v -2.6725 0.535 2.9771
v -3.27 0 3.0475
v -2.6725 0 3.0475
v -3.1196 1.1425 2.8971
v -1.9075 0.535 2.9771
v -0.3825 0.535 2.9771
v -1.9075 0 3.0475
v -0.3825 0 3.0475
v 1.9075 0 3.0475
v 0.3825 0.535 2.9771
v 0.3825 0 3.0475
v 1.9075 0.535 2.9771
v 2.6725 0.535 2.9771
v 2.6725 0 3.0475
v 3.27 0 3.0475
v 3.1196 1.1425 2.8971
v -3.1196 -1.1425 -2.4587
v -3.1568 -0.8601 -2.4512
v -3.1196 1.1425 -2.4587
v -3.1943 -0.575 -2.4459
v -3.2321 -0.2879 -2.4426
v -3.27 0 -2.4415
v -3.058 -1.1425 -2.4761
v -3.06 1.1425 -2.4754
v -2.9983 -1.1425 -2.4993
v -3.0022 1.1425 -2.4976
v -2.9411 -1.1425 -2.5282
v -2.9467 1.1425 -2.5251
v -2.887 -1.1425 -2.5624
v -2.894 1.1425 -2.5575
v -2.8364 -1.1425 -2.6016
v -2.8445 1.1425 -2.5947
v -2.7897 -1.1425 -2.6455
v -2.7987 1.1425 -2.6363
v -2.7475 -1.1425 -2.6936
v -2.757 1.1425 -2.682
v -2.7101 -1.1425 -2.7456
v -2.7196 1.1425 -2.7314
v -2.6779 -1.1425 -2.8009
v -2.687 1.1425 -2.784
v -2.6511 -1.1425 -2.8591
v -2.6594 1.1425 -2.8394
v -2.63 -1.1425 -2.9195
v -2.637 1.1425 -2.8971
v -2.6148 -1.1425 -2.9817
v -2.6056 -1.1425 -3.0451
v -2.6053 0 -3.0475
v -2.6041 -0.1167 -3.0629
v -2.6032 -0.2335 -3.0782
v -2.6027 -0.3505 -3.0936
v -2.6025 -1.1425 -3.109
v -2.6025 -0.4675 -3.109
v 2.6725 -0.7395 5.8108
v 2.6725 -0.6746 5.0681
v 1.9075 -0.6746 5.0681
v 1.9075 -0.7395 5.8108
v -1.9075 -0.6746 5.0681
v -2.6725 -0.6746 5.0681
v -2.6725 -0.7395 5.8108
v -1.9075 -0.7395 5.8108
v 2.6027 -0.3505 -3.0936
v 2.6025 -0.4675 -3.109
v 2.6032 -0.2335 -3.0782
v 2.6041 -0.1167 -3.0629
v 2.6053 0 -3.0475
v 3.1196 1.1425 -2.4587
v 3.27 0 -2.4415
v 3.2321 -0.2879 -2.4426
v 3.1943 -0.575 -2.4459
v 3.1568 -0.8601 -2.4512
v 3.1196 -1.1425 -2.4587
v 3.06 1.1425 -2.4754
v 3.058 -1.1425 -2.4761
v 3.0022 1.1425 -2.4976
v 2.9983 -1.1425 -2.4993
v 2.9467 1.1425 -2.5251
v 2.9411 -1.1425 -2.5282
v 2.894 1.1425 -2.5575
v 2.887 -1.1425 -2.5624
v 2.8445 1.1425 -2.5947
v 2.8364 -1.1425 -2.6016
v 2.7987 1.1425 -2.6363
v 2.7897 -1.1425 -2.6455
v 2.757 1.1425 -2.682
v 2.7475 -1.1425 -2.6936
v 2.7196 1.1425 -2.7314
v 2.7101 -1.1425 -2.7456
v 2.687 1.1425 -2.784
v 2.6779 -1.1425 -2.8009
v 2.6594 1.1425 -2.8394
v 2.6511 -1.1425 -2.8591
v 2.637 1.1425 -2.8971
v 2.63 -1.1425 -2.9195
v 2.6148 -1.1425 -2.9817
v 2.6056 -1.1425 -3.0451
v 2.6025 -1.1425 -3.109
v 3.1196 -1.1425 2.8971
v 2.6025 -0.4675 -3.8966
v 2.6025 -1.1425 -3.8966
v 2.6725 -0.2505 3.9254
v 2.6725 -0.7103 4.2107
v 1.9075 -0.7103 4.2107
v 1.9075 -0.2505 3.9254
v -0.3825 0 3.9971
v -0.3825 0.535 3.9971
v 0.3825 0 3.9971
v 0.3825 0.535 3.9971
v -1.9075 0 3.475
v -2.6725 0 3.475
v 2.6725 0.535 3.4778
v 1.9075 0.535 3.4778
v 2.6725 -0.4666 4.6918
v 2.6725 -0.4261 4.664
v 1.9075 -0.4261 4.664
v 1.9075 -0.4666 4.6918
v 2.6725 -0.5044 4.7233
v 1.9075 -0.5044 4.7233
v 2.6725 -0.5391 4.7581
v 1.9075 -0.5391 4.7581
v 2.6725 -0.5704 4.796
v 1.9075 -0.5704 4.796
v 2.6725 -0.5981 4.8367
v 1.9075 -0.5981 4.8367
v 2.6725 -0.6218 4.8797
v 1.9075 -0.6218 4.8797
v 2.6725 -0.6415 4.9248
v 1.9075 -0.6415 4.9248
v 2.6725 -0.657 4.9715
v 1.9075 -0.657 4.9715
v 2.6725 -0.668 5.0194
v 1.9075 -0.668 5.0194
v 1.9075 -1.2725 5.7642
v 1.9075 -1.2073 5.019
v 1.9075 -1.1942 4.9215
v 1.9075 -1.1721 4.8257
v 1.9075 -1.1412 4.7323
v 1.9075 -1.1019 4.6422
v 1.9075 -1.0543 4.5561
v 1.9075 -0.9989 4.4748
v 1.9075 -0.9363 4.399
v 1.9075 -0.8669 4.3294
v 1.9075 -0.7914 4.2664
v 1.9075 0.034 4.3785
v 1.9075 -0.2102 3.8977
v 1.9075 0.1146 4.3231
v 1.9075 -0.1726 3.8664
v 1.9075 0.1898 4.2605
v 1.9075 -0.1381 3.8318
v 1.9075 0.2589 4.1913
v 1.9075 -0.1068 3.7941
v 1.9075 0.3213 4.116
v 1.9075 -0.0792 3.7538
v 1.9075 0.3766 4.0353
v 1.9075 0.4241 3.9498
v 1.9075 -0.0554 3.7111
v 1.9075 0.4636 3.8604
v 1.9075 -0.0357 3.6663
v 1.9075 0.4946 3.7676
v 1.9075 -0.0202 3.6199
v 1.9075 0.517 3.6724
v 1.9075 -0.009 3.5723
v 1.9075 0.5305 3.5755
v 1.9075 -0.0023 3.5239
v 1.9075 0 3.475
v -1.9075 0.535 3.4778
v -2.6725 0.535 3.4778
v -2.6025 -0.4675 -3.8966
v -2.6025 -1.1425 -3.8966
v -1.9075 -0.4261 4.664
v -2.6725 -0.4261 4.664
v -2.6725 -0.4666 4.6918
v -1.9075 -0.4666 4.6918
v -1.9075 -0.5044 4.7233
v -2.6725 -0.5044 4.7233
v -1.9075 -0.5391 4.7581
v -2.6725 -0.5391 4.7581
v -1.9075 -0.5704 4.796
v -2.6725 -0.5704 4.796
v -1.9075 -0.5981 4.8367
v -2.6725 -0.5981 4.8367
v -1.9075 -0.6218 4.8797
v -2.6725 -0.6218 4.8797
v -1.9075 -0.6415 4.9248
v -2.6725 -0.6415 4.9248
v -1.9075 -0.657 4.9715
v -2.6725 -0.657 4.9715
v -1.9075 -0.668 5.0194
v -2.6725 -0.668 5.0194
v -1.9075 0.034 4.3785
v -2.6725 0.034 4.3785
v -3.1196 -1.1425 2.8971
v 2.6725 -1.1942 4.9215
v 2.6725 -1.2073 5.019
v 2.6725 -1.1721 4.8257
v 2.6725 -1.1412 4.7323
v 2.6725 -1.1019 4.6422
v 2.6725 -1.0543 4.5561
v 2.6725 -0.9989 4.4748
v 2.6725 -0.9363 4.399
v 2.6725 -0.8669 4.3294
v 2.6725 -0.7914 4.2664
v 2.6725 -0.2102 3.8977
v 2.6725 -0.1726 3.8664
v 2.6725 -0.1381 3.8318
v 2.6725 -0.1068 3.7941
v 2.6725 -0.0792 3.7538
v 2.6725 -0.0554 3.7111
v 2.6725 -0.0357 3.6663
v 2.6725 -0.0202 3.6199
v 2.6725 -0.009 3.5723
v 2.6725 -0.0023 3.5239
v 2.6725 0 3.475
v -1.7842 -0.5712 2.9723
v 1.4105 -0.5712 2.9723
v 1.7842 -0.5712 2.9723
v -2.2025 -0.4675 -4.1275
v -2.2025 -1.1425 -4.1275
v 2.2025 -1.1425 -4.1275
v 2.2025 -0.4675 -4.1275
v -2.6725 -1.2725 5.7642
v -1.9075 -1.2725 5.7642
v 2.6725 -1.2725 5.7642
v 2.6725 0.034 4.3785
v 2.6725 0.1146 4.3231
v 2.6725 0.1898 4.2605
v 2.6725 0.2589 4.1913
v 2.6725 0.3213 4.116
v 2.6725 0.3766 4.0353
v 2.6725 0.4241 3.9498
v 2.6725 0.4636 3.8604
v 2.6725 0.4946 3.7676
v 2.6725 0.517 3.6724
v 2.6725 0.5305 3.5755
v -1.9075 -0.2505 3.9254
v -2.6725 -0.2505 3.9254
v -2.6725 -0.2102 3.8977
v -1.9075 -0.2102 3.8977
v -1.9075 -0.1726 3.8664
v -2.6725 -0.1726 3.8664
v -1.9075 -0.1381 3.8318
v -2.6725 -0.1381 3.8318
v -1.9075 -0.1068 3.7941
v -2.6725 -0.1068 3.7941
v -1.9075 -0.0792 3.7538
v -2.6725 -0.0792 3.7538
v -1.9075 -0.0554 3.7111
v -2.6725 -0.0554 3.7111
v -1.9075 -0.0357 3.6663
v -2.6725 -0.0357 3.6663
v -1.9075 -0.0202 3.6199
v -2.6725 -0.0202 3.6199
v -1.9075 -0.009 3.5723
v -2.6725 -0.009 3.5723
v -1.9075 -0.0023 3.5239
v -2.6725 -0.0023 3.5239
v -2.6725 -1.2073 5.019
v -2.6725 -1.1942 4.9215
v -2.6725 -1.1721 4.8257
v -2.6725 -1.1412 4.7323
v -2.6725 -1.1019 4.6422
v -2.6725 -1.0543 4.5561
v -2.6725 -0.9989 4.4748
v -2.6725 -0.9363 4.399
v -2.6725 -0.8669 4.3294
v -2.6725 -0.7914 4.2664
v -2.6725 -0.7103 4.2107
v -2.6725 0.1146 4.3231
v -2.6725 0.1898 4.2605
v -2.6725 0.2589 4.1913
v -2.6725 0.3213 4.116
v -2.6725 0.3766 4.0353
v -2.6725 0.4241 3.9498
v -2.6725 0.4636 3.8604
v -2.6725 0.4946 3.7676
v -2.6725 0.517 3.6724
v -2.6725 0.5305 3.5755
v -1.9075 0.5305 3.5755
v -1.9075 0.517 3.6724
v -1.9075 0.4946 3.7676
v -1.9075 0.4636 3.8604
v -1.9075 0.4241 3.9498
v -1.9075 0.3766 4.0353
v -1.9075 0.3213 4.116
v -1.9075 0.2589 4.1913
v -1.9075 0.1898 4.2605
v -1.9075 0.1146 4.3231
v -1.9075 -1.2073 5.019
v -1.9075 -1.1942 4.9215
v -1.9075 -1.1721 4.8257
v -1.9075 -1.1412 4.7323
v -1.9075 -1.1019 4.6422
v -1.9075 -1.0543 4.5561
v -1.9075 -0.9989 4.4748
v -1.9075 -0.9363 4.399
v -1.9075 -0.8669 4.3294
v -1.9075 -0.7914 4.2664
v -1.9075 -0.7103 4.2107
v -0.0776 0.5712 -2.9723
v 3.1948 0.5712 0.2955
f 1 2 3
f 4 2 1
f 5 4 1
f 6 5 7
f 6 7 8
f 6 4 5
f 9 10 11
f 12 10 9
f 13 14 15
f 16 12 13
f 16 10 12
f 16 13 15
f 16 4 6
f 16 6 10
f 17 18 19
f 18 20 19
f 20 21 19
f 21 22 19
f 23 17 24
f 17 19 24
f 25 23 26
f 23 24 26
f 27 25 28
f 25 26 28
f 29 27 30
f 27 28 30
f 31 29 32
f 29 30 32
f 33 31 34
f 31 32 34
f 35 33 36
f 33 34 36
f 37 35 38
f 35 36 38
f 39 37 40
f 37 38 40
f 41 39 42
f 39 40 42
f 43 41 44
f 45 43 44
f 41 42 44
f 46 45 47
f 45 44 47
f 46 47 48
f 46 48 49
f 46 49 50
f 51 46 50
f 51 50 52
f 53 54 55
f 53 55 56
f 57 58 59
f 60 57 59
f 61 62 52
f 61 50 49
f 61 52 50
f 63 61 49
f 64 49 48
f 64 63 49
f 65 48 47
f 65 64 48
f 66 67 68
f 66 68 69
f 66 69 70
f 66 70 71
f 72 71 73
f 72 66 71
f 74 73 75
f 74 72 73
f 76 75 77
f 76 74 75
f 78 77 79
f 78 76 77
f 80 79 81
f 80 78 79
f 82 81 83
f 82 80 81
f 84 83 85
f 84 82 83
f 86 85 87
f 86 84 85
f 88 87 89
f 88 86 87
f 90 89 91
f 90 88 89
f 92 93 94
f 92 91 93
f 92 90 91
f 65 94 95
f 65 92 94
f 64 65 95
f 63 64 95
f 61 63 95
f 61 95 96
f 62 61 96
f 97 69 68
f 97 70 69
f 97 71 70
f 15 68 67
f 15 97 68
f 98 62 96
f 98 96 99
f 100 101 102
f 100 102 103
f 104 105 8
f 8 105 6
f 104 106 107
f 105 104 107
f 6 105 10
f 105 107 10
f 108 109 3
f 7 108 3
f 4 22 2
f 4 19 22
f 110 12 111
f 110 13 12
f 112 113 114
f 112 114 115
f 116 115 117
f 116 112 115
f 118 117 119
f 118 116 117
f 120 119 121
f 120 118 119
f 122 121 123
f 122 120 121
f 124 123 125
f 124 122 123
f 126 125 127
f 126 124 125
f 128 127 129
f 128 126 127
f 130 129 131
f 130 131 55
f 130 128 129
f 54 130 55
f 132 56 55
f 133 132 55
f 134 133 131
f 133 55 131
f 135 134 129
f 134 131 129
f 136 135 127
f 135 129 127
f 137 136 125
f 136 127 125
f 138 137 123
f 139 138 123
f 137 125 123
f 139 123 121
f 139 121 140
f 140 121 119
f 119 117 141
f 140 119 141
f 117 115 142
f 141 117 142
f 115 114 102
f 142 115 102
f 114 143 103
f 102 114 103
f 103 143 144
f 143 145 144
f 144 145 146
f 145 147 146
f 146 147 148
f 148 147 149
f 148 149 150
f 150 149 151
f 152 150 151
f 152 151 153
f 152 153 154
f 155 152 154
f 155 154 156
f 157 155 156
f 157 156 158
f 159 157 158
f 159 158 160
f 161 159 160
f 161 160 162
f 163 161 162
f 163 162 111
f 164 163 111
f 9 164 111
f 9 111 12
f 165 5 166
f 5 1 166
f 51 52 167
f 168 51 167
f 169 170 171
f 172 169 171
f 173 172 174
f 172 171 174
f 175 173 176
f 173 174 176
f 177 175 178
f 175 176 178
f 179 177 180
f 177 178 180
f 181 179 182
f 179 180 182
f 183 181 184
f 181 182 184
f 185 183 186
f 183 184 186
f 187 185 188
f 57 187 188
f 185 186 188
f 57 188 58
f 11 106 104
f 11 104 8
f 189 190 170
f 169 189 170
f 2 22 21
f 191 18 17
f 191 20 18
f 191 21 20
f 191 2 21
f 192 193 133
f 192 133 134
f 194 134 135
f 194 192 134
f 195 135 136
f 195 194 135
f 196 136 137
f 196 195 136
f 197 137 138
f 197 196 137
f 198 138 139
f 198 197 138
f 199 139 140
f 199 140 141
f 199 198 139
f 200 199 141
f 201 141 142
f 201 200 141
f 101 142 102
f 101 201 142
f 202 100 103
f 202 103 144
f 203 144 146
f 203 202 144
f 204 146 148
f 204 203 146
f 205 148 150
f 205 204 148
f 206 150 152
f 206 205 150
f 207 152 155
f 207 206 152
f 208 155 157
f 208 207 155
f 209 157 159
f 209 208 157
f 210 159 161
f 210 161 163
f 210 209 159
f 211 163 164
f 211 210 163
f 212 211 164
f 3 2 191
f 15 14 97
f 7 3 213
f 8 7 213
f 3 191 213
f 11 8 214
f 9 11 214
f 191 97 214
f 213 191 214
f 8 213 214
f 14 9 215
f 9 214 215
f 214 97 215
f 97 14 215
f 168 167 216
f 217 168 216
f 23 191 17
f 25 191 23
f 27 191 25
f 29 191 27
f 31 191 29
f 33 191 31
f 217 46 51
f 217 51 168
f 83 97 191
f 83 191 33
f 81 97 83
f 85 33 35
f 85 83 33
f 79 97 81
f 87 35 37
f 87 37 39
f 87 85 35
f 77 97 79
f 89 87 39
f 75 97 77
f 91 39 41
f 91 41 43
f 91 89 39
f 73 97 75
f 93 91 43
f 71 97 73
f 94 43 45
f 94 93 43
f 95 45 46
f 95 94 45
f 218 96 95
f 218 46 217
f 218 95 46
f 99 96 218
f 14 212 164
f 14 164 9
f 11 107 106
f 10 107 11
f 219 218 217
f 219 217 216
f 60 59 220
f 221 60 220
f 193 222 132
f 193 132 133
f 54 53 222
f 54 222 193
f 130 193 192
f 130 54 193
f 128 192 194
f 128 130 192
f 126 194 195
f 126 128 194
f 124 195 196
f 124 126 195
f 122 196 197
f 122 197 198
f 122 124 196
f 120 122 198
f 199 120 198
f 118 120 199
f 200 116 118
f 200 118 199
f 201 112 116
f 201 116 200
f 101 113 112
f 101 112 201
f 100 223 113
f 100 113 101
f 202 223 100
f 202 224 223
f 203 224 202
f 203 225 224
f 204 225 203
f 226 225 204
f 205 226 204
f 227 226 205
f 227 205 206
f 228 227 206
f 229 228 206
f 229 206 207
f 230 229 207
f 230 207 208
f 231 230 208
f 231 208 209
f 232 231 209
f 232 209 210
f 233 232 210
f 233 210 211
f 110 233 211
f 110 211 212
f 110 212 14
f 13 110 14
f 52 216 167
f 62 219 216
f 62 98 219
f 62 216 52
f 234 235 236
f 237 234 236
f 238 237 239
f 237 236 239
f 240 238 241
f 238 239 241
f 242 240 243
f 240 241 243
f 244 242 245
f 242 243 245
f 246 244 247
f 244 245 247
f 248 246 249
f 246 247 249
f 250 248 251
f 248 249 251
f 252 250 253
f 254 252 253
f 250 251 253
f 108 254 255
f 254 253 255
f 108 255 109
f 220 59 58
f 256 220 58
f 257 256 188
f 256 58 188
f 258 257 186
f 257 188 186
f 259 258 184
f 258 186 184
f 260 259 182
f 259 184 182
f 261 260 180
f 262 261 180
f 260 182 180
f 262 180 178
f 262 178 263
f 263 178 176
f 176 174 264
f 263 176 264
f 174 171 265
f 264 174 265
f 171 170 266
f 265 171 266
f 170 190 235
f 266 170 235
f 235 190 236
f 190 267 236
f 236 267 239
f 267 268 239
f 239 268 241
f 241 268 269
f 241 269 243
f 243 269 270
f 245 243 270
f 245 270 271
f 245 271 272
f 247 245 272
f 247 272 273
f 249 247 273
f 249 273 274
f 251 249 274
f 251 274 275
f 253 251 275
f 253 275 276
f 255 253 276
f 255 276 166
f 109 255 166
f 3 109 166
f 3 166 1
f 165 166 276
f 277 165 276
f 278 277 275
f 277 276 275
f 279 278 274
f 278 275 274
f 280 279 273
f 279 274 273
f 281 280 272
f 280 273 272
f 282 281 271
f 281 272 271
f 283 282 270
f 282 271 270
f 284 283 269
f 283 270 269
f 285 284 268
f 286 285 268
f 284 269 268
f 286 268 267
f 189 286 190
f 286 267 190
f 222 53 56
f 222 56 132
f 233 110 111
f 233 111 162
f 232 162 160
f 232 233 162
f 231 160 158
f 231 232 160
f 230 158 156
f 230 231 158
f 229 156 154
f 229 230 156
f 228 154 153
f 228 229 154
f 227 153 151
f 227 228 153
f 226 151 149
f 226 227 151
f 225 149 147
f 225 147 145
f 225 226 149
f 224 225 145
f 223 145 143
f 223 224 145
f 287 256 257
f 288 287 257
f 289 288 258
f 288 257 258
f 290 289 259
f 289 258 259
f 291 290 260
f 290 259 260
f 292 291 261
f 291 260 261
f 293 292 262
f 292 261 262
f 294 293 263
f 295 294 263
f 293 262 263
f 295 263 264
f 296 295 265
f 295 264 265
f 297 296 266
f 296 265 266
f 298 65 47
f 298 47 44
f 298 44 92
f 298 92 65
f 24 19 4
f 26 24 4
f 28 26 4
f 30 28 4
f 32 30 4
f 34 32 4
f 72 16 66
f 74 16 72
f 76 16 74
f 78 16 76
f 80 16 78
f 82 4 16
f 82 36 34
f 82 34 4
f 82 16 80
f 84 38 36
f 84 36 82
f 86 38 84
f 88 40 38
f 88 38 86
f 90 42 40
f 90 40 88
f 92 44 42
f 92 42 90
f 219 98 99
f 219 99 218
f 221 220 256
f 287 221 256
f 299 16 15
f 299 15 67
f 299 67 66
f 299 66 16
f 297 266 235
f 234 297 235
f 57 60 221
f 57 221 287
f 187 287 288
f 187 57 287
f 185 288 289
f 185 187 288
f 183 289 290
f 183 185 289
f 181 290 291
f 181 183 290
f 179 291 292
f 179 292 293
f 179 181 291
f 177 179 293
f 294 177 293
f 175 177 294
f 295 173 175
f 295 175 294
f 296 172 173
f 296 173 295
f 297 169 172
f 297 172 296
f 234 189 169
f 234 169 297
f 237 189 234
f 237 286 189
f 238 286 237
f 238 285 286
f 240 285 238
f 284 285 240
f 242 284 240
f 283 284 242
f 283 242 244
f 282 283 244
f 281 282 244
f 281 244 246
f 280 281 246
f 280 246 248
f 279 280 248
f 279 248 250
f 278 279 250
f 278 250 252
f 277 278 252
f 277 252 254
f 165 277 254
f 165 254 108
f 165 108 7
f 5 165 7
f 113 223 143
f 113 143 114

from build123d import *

# Parameters (mm, degrees)
SKETCH1_W                  = 6.54
SKETCH1_H                  = 6.095
EXTRUDE1_DEPTH             = 1.1425
EXTRUDE1_TAPER             = 7.5
EXTRUDE1_OTHER_WAY_DEPTH   = 1.1425
EXTRUDE1_OTHER_WAY_TAPER   = 7.5
EXTRUDE2_REACH             = 6.614
EXTRUDE2_DIRECTION_2_REACH = 6.614
CUT_EXTRUDE5_REACH         = 7.74
EXTRUDE5_DEPTH             = 0.3825
SKETCH29_W                 = 1.02
SKETCH29_H                 = 0.535
EXTRUDE6_DEPTH             = 0.3825


with BuildPart() as part:
    # Sketch1 → Extrude1 (new body)
    with BuildSketch(Plane(origin=(0, 0, 0), x_dir=(1, 0, 0), z_dir=(0, 1, 0))):
        Rectangle(SKETCH1_W, SKETCH1_H)
    extrude(amount=EXTRUDE1_DEPTH, taper=EXTRUDE1_TAPER)

    # Sketch1 → Extrude1 other way (add)
    with BuildSketch(Plane(origin=(0, 0, 0), x_dir=(1, 0, 0), z_dir=(0, 1, 0))):
        Rectangle(SKETCH1_W, SKETCH1_H)
    extrude(amount=-EXTRUDE1_OTHER_WAY_DEPTH, taper=EXTRUDE1_OTHER_WAY_TAPER)

    # Extrude2: up to this plane
    extrude2_end = Plane(origin=(3.27, 0, -3.0475), z_dir=(0.9914448613738104, -0.13052619222005188, 0))
    # Sketch2 → Extrude2 (add, up to the surface)
    with BuildSketch(Plane(origin=(0, 0, 0), x_dir=(0, 0, -1), z_dir=(1, 0, 0)), mode=Mode.PRIVATE) as extrude2_sk1:
        Polygon((3.0475, 0), (2.897087022, -1.1425), (4.1275, -1.1425), (4.1275, -0.4675), (3.109047543, -0.4675), align=None)
    extrude2_tool1 = split(extrude(extrude2_sk1.sketch, amount=EXTRUDE2_REACH, mode=Mode.PRIVATE), bisect_by=extrude2_end, keep=Keep.BOTH, mode=Mode.PRIVATE)
    add(extrude2_tool1.solids().sort_by_distance((0, -0.791952, -3.517345))[0])

    # Extrude2 direction 2: up to this plane
    extrude2_direction_2_end = Plane(origin=(-3.27, 0, -3.0475), z_dir=(-0.9914448613738104, -0.13052619222005188, 0))
    # Sketch2 → Extrude2 direction 2 (add, up to the surface)
    with BuildSketch(Plane(origin=(0, 0, 0), x_dir=(0, 0, -1), z_dir=(1, 0, 0)), mode=Mode.PRIVATE) as extrude2_direction_2_sk1:
        Polygon((3.0475, 0), (2.897087022, -1.1425), (4.1275, -1.1425), (4.1275, -0.4675), (3.109047543, -0.4675), align=None)
    extrude2_direction_2_tool1 = split(extrude(extrude2_direction_2_sk1.sketch, amount=-EXTRUDE2_DIRECTION_2_REACH, mode=Mode.PRIVATE), bisect_by=extrude2_direction_2_end, keep=Keep.BOTH, mode=Mode.PRIVATE)
    add(extrude2_direction_2_tool1.solids().sort_by_distance((0, -0.791952, -3.517345))[0])

    # Sketch27 → Cut-Extrude5 (cut, up to next)
    with BuildSketch(Plane(origin=(0, 1.1425, 0), x_dir=(1, 0, 0), z_dir=(0, 1, 0)), mode=Mode.PRIVATE) as cut_extrude5_sk1:
        with BuildLine():
            Line((2.6025, 3.109047543), (2.6025, 3.896559892))
            Line((2.6025, 3.896559892), (2.2025, 4.1275))
            Line((2.2025, 4.1275), (3.27, 4.1275))
            Line((3.27, 4.1275), (3.27, 2.441547543))
            ThreePointArc((3.27, 2.441547543), (2.798006224, 2.637053766), (2.6025, 3.109047543))
        make_face()
    cut_extrude5_tool1 = extrude(cut_extrude5_sk1.sketch, amount=-CUT_EXTRUDE5_REACH, mode=Mode.PRIVATE) & part.part
    # Sketch27 → Cut-Extrude5 (cut, up to next)
    with BuildSketch(Plane(origin=(0, 1.1425, 0), x_dir=(1, 0, 0), z_dir=(0, 1, 0)), mode=Mode.PRIVATE) as cut_extrude5_sk2:
        with BuildLine():
            Line((-2.6025, 3.896559892), (-2.2025, 4.1275))
            Line((-2.2025, 4.1275), (-3.27, 4.1275))
            Line((-3.27, 4.1275), (-3.27, 2.441547543))
            ThreePointArc((-3.27, 2.441547543), (-2.798006224, 2.637053766), (-2.6025, 3.109047543))
            Line((-2.6025, 3.109047543), (-2.6025, 3.896559892))
        make_face()
    cut_extrude5_tool2 = extrude(cut_extrude5_sk2.sketch, amount=-CUT_EXTRUDE5_REACH, mode=Mode.PRIVATE) & part.part
    add(cut_extrude5_tool1.solids().sort_by_distance((2.932609, 1.1425, -3.37907))[0], mode=Mode.SUBTRACT)
    add(cut_extrude5_tool2.solids().sort_by_distance((-2.932609, 1.1425, -3.37907))[0], mode=Mode.SUBTRACT)

    # Sketch28 → Extrude5 (add, symmetric)
    with BuildSketch(Plane(origin=(2.29, 0, 0), x_dir=(0, 0, -1), z_dir=(1, 0, 0))):
        with BuildLine():
            Line((-2.977065914, 0.535), (-3.477818827, 0.535))
            ThreePointArc((-3.477818827, 0.535), (-3.993129319, 0.401312635), (-4.378457731, 0.033971882))
            Line((-4.378457731, 0.033971882), (-4.663971185, -0.426059351))
            ThreePointArc((-4.663971185, -0.426059351), (-4.836678027, -0.598050142), (-5.068098093, -0.6745566))
            Line((-5.068098093, -0.6745566), (-5.810814161, -0.739535837))
            Line((-5.810814161, -0.739535837), (-5.764185839, -1.2725))
            Line((-5.764185839, -1.2725), (-5.018976864, -1.207302663))
            ThreePointArc((-5.018976864, -1.207302663), (-4.556136732, -1.054289745), (-4.210723048, -0.710308165))
            Line((-4.210723048, -0.710308165), (-3.925356764, -0.250514059))
            ThreePointArc((-3.925356764, -0.250514059), (-3.732692558, -0.066843683), (-3.475037312, 0))
            Line((-3.475037312, 0), (-2.977065914, 0))
            Line((-2.977065914, 0), (-2.977065914, 0.535))
        make_face()
    extrude5 = extrude(amount=EXTRUDE5_DEPTH, both=True)

    # Sketch29 → Extrude6 (add, symmetric)
    with BuildSketch(Plane(origin=(0, 0, 0), x_dir=(0, 0, -1), z_dir=(1, 0, 0))):
        with Locations((-3.487065914, 0.2675)):
            Rectangle(SKETCH29_W, SKETCH29_H)
    extrude(amount=EXTRUDE6_DEPTH, both=True)

    # Mirror1: Extrude5 across plane
    add(extrude5.mirror(Plane(origin=(0, 0, 0), x_dir=(0, 0, 1), z_dir=(1, 0, 0))))


solid = part.part
